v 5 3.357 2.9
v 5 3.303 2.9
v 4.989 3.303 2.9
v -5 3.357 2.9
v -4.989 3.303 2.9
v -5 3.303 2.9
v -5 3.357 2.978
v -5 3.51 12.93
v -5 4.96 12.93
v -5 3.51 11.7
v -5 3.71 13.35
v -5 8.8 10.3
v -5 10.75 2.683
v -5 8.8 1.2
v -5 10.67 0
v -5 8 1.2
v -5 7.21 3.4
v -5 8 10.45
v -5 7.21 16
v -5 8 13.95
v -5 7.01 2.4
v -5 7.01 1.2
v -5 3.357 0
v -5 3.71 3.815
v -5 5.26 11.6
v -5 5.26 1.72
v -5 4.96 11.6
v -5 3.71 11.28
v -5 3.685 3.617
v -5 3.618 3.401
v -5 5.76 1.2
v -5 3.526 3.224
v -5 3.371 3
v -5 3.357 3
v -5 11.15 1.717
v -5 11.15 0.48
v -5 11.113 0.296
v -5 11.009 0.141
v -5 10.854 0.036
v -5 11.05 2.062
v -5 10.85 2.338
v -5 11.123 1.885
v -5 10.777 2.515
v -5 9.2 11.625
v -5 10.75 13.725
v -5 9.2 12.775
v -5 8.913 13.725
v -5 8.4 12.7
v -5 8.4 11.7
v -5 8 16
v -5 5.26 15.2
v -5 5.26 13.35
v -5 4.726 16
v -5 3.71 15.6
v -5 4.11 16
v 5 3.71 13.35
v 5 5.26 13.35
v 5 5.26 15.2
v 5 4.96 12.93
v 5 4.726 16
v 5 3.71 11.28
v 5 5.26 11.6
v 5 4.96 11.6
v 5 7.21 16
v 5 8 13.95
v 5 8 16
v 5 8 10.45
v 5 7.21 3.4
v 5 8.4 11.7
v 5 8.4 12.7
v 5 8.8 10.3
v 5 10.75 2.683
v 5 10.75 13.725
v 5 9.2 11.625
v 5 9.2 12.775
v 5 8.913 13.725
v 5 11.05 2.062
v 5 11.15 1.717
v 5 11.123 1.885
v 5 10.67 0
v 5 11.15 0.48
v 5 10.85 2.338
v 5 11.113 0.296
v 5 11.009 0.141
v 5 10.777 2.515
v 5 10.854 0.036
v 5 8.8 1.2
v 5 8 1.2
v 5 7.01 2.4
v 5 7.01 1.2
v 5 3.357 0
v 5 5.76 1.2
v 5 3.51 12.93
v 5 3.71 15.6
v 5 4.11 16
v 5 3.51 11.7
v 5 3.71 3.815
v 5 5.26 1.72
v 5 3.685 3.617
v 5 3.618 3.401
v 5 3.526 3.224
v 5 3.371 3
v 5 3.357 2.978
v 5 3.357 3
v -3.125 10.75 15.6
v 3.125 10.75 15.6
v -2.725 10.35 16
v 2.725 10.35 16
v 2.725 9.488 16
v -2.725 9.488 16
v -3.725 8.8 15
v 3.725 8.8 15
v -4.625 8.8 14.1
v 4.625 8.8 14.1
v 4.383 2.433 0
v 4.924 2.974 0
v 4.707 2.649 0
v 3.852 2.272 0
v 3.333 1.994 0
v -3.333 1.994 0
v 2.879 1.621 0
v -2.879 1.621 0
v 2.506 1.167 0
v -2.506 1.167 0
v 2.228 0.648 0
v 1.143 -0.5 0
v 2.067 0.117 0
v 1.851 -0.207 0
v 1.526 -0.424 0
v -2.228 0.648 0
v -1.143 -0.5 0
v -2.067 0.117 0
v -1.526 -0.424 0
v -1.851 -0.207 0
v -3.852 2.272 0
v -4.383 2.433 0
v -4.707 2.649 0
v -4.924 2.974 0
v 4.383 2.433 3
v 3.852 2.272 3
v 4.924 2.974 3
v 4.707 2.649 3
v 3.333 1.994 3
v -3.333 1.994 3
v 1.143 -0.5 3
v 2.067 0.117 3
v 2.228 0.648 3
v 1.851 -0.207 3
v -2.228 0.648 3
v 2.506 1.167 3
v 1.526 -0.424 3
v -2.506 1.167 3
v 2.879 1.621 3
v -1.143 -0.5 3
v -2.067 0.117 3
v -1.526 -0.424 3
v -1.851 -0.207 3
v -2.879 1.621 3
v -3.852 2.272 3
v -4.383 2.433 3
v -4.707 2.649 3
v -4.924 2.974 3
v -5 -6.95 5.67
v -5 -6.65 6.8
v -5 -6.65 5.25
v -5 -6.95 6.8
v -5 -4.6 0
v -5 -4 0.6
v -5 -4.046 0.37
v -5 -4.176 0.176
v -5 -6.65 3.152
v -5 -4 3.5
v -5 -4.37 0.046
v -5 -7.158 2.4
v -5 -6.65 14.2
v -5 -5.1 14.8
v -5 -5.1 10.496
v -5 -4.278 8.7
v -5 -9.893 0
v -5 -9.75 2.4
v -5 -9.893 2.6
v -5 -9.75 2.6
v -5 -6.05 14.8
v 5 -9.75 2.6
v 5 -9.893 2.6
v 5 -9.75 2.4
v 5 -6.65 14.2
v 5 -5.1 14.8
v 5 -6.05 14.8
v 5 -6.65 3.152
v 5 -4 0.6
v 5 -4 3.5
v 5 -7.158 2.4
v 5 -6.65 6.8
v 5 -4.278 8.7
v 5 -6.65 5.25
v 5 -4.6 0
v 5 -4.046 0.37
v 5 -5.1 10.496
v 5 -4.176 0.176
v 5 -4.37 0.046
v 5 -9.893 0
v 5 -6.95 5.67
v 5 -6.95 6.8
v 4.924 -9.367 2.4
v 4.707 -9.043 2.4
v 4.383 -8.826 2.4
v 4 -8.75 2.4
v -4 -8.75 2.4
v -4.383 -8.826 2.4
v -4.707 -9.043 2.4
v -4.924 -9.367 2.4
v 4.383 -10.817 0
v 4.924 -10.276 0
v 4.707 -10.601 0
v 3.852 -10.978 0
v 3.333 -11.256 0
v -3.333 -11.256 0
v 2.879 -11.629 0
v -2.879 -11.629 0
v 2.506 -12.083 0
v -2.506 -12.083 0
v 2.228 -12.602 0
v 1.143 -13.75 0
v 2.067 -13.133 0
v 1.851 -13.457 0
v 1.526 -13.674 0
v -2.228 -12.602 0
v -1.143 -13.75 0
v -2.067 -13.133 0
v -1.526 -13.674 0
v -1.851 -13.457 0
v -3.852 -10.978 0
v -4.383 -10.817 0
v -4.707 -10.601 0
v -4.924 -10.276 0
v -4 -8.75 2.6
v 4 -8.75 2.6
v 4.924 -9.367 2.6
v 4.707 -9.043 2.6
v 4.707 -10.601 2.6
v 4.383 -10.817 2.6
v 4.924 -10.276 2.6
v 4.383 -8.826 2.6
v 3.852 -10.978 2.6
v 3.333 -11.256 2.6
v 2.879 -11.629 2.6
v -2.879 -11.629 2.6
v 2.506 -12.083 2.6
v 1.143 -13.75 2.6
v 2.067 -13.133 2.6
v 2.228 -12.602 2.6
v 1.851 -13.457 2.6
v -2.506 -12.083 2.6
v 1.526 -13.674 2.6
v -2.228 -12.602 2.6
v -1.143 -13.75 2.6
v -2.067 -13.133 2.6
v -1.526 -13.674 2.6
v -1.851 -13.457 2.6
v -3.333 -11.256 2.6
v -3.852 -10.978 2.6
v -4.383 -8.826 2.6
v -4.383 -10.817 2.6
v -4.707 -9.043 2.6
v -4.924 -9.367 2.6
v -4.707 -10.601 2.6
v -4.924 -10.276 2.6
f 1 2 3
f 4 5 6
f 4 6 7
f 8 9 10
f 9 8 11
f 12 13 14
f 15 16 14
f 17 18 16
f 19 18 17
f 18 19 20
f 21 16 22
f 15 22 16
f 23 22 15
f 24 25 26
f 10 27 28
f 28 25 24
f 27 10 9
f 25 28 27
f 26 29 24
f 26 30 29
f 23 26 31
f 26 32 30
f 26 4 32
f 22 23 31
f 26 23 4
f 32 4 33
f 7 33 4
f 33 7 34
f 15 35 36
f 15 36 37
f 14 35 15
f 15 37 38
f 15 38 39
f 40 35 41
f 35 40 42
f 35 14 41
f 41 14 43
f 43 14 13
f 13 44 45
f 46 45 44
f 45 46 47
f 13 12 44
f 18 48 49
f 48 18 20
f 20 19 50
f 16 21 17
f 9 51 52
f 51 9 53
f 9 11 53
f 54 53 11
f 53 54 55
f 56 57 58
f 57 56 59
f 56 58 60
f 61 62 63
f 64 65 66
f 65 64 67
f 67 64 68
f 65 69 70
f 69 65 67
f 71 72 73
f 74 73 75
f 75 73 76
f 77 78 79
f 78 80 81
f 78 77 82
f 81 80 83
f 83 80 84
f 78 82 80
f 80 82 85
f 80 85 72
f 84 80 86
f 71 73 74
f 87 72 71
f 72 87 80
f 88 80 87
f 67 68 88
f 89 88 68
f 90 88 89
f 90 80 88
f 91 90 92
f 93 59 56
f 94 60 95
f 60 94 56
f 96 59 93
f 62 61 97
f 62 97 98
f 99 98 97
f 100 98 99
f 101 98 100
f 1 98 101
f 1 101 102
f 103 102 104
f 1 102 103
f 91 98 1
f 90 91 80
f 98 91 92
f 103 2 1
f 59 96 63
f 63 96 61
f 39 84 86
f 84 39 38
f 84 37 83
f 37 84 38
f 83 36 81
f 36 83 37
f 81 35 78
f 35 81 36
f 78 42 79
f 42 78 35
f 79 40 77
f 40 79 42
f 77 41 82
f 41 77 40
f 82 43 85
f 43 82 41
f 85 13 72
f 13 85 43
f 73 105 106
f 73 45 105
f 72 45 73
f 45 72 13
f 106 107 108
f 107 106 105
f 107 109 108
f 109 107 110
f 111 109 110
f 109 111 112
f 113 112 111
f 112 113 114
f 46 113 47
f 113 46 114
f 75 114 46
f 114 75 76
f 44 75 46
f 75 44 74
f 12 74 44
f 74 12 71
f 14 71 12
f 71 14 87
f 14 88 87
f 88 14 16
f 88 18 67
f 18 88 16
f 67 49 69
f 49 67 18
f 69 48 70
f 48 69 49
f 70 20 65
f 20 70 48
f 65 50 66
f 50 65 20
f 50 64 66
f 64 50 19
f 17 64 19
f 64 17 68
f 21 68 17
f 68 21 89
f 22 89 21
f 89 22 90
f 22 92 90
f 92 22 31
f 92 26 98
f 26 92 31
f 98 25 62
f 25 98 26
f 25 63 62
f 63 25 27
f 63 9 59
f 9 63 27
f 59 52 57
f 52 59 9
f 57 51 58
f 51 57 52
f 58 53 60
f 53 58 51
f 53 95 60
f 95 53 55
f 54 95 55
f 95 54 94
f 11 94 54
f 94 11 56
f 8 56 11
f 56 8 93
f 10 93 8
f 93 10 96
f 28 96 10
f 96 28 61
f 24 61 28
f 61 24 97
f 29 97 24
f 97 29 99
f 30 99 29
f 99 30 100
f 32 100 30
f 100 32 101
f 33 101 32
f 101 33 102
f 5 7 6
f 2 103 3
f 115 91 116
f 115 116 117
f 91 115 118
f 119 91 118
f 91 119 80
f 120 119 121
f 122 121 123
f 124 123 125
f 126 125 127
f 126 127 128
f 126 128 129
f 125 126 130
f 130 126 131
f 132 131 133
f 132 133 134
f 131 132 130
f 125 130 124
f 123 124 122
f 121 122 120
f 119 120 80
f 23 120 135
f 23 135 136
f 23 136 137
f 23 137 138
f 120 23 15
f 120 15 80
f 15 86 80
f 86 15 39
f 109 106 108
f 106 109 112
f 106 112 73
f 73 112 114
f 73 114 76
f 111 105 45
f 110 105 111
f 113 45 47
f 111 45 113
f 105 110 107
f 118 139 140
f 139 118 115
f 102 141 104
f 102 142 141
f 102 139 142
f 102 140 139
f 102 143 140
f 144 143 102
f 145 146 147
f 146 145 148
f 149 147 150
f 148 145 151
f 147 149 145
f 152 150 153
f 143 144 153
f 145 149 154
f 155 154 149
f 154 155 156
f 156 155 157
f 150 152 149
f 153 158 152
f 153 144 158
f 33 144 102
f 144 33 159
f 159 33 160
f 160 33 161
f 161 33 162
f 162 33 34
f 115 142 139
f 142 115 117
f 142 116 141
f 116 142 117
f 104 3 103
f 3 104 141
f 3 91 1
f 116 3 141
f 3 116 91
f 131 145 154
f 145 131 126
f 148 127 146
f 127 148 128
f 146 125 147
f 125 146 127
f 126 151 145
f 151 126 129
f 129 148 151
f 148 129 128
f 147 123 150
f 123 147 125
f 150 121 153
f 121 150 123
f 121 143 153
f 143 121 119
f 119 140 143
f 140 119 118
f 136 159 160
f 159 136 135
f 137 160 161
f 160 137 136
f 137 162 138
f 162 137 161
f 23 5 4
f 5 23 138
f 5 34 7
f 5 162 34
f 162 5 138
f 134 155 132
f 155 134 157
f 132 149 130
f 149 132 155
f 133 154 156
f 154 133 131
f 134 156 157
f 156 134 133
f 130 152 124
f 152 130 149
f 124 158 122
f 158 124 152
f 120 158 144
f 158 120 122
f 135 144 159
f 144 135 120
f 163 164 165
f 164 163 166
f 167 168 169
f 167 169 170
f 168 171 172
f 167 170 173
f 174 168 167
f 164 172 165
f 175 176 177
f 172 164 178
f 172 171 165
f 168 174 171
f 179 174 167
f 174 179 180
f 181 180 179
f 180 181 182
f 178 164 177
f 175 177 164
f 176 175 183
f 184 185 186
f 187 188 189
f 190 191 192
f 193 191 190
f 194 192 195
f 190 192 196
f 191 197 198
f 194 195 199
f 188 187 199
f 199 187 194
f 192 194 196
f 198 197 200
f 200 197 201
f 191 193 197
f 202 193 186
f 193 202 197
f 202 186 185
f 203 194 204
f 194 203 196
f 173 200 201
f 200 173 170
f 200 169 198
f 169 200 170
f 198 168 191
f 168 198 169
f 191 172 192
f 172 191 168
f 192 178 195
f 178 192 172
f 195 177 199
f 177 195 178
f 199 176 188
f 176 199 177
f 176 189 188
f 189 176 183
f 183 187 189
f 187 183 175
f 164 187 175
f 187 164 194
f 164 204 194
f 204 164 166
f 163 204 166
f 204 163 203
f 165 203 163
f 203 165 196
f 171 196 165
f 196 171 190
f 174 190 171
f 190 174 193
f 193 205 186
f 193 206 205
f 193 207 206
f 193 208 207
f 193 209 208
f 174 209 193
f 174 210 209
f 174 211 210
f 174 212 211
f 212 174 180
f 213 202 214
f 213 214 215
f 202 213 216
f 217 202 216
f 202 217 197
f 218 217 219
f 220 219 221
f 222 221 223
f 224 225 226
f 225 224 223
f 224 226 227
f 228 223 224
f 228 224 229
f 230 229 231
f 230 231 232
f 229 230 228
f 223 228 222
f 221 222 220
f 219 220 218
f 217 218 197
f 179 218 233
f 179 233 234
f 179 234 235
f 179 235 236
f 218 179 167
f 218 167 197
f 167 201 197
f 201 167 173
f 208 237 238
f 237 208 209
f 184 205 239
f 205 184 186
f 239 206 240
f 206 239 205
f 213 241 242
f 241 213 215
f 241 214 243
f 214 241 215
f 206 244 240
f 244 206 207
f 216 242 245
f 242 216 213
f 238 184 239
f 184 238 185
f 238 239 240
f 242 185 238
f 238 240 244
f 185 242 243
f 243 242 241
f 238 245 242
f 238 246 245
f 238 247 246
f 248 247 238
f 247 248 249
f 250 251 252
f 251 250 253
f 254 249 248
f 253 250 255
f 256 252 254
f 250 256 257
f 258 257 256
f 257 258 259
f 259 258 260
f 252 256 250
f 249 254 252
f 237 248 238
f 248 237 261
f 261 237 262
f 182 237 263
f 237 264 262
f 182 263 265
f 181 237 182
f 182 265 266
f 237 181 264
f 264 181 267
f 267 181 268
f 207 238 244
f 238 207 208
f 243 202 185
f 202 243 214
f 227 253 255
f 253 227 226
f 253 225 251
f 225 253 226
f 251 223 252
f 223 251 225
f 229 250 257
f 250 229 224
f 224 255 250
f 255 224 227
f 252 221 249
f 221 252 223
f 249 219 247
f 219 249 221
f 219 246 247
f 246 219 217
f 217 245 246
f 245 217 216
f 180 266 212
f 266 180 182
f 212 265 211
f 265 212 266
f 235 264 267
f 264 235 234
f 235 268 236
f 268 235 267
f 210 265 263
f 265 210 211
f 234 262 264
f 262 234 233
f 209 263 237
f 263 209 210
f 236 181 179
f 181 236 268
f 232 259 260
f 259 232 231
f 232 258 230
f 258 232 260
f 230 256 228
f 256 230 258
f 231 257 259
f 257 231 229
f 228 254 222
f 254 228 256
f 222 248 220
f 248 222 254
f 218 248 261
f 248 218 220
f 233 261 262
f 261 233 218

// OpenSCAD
// Bag sealer v3.1 by DrLex, 2017/10- 2020/05
// Released under Creative Commons - Attribution license

// Length of the clip in millimeters
length = 10; //[10:1:250]

// Width of the open gap. The gap will become about 0.75mm narrower with the insert in place. A good value is the thickness of the folded bag plus 0.5mm.
gap = 0.8; //[.1:.05:3]

// Generate extra 'nubs' that make it easier to push the parts out of each other?
nubs = "yes"; //[yes,no]

// Enable this to create a stronger model (requires more material to print, usually overkill).
heavy_duty = "no"; //[yes,no]

// Generate what parts?
generate = "both"; //[both,clip,insert]

/* [Hidden] */
doNubs = nubs == "yes" ? true : false;
saveMaterial = heavy_duty == "yes" ? false : true;
shiftXtra = doNubs ? 1 : 0;
shiftClip = generate == "both" ? 7 + shiftXtra : 0;
shiftInsert = generate == "both" ? -(3 + shiftXtra) : 4;

if(generate == "both" || generate == "clip") {
    translate([0, shiftClip, 0]) {
        difference() {
            rotate([90, 0, 90]) linear_extrude(length, center=true, convexity=6) clipPoly(gap);
            translate([length/2+.1, 1.7+gap, 16.1]) rotate([0,45,0]) cube(3.5, center=true);
            translate([-length/2-.1, 1.7+gap, 16.1]) rotate([0,45,0]) cube(3.5, center=true);

            if(saveMaterial && length > 25) {
                translate([0, -8.7, -1]) {
                    hull() {
                        translate([-length/2 + 9.2, 0, 0]) cylinder(r=4, h=10, $fn=48);
                        translate([length/2 - 9.2, 0, 0]) cylinder(r=4, h=10, $fn=48);
                    }
                }
            }

            if(doNubs) {
                translate([length/2-1, -6.5, -.5]) cube([2, 2, 3.4]);
                translate([-length/2-1, -6.5, -.5]) cube([2, 2, 3.4]);
            }
        }
        if(doNubs) {
            translate([length/2, 0, 0]) nub(3);
            translate([-length/2, 0, 0]) mirror([1, 0, 0]) nub(3);
        }
    }
}
if(generate == "both" || generate == "insert") {
    translate([0, shiftInsert, 0]) {
        difference() {
            rotate([90, 0, 90]) linear_extrude(length, center=true, convexity=6) insertPoly();

            if(doNubs) {
                translate([length/2-3, -10, -.5]) cube([6, 4.12, 3.4]);
                translate([-length/2-3, -10, -.5]) cube([6, 4.12, 3.4]);
            }

            if(saveMaterial && length > 25) {
                translate([0, -9.5, -1]) {
                    hull() {
                        translate([-length/2 + 13, 0, 0]) cylinder(r=5, h=10, $fn=48);
                        translate([length/2 - 13, 0, 0]) cylinder(r=5, h=10, $fn=48);
                        translate([-length/2 + 7.7, .2, 0]) cube([1,1,10], center=true);
                        translate([length/2 - 7.7, .2, 0]) cube([1,1,10], center=true);
                    }
                }
            }
        }
        if(doNubs) {
            translate([length/2, -1.25, 0]) nub(2.6);
            translate([-length/2, -1.25, 0]) mirror([1, 0, 0]) nub(2.6);
        }
    }
}

module nub(h) {
    minkowski() {
        difference() {
            translate([-6, -7.5, 0]) cube([5, 3, h-1]);
            translate([0, -8.5, -.5]) cylinder(r=4, h=4, $fn=32);            
        }
        cylinder(r=1, h=1, $fn=16);
    }
}

module clipPoly(ox) {
    polygon(convexity=6, points=[
    [0.0, 1.2],
    [0.0, 10.45],
    [0.4, 11.7],
    [0.4, 12.7],
    [0.0, 13.95],
    [0.0, 16.0],
    [-0.79, 16.0],
    [-0.79, 3.4],
    [-0.99, 2.4],
    [-0.99, 1.2],
    [-2.24, 1.2],
    [-2.74, 1.72],
    [-2.74, 11.6],
    [-3.04, 11.6],
    [-3.04, 12.9299],
    [-2.74, 13.35],
    [-2.74, 15.2],
    [-3.2737, 16.0],
    [-3.89, 16.0],
    [-4.29, 15.6],
    [-4.29, 13.35],
    [-4.49, 12.9299],
    [-4.49, 11.7],
    [-4.29, 11.2799],
    [-4.29, 3.8146],
    [-4.3146, 3.6169],
    [-4.382, 3.4007],
    [-4.474, 3.224],
    [-5.106, 2.3078],
    [-5.198, 2.1311],
    [-5.2654, 1.9149],
    [-5.29, 1.7172],
    [-5.29, 0.48],
    [-5.2535, 0.2963],
    [-5.1494, 0.1406],
    [-4.9937, 0.0365],
    [-4.81, 0.0],

    [1.87+ox, 0.0],
    [2.0537+ox, 0.0365],
    [2.2094+ox, 0.1406],
    [2.3135+ox, 0.2963],
    [2.35+ox, 0.48],
    [2.35+ox, 1.7172],
    [2.3232+ox, 1.8854],
    [2.25+ox, 2.0621],
    [2.15+ox, 2.2],
    [2.05+ox, 2.3379],
    [1.9768+ox, 2.5146],
    [1.95+ox, 2.6828],
    [1.95+ox, 15.6],
    [1.55+ox, 16.0],
    [0.6883+ox, 16.0],
    [ox, 15.0],
    [ox, 14.1],
    [0.4+ox, 12.775],
    [0.4+ox, 11.625],
    [ox, 10.3],
    [ox, 1.2]
    ]);
}

module insertPoly() {
    shorten = saveMaterial ? 1.6 : 0;
    polygon(convexity=4, points=[
        [0.0, 0.6],
        [0.0, 3.5],
        [-0.2783, 8.7],
        [-1.1, 10.496],
        [-1.1, 16.4 - shorten],
        [-2.05, 16.4 - shorten],
        [-2.65, 15.8 - shorten],
        [-2.65, 6.8],
        [-2.95, 6.8],
        [-2.95, 5.67],
        [-2.65, 5.25],
        [-2.65, 3.1523],
        [-3.1583, 2.4],
        [-8.15, 2.4],
        [-8.3796, 2.3543],
        [-8.5743, 2.2243],
        [-8.7043, 2.0296],
        [-8.75, 1.8],
        [-8.75, 0.6],
        [-8.7043, 0.3704],
        [-8.5743, 0.1757],
        [-8.3796, 0.0457],
        [-8.15, 0.0],
        [-0.6, 0.0],
        [-0.3704, 0.0457],
        [-0.1757, 0.1757],
        [-0.0457, 0.3704]
    ]);
}
